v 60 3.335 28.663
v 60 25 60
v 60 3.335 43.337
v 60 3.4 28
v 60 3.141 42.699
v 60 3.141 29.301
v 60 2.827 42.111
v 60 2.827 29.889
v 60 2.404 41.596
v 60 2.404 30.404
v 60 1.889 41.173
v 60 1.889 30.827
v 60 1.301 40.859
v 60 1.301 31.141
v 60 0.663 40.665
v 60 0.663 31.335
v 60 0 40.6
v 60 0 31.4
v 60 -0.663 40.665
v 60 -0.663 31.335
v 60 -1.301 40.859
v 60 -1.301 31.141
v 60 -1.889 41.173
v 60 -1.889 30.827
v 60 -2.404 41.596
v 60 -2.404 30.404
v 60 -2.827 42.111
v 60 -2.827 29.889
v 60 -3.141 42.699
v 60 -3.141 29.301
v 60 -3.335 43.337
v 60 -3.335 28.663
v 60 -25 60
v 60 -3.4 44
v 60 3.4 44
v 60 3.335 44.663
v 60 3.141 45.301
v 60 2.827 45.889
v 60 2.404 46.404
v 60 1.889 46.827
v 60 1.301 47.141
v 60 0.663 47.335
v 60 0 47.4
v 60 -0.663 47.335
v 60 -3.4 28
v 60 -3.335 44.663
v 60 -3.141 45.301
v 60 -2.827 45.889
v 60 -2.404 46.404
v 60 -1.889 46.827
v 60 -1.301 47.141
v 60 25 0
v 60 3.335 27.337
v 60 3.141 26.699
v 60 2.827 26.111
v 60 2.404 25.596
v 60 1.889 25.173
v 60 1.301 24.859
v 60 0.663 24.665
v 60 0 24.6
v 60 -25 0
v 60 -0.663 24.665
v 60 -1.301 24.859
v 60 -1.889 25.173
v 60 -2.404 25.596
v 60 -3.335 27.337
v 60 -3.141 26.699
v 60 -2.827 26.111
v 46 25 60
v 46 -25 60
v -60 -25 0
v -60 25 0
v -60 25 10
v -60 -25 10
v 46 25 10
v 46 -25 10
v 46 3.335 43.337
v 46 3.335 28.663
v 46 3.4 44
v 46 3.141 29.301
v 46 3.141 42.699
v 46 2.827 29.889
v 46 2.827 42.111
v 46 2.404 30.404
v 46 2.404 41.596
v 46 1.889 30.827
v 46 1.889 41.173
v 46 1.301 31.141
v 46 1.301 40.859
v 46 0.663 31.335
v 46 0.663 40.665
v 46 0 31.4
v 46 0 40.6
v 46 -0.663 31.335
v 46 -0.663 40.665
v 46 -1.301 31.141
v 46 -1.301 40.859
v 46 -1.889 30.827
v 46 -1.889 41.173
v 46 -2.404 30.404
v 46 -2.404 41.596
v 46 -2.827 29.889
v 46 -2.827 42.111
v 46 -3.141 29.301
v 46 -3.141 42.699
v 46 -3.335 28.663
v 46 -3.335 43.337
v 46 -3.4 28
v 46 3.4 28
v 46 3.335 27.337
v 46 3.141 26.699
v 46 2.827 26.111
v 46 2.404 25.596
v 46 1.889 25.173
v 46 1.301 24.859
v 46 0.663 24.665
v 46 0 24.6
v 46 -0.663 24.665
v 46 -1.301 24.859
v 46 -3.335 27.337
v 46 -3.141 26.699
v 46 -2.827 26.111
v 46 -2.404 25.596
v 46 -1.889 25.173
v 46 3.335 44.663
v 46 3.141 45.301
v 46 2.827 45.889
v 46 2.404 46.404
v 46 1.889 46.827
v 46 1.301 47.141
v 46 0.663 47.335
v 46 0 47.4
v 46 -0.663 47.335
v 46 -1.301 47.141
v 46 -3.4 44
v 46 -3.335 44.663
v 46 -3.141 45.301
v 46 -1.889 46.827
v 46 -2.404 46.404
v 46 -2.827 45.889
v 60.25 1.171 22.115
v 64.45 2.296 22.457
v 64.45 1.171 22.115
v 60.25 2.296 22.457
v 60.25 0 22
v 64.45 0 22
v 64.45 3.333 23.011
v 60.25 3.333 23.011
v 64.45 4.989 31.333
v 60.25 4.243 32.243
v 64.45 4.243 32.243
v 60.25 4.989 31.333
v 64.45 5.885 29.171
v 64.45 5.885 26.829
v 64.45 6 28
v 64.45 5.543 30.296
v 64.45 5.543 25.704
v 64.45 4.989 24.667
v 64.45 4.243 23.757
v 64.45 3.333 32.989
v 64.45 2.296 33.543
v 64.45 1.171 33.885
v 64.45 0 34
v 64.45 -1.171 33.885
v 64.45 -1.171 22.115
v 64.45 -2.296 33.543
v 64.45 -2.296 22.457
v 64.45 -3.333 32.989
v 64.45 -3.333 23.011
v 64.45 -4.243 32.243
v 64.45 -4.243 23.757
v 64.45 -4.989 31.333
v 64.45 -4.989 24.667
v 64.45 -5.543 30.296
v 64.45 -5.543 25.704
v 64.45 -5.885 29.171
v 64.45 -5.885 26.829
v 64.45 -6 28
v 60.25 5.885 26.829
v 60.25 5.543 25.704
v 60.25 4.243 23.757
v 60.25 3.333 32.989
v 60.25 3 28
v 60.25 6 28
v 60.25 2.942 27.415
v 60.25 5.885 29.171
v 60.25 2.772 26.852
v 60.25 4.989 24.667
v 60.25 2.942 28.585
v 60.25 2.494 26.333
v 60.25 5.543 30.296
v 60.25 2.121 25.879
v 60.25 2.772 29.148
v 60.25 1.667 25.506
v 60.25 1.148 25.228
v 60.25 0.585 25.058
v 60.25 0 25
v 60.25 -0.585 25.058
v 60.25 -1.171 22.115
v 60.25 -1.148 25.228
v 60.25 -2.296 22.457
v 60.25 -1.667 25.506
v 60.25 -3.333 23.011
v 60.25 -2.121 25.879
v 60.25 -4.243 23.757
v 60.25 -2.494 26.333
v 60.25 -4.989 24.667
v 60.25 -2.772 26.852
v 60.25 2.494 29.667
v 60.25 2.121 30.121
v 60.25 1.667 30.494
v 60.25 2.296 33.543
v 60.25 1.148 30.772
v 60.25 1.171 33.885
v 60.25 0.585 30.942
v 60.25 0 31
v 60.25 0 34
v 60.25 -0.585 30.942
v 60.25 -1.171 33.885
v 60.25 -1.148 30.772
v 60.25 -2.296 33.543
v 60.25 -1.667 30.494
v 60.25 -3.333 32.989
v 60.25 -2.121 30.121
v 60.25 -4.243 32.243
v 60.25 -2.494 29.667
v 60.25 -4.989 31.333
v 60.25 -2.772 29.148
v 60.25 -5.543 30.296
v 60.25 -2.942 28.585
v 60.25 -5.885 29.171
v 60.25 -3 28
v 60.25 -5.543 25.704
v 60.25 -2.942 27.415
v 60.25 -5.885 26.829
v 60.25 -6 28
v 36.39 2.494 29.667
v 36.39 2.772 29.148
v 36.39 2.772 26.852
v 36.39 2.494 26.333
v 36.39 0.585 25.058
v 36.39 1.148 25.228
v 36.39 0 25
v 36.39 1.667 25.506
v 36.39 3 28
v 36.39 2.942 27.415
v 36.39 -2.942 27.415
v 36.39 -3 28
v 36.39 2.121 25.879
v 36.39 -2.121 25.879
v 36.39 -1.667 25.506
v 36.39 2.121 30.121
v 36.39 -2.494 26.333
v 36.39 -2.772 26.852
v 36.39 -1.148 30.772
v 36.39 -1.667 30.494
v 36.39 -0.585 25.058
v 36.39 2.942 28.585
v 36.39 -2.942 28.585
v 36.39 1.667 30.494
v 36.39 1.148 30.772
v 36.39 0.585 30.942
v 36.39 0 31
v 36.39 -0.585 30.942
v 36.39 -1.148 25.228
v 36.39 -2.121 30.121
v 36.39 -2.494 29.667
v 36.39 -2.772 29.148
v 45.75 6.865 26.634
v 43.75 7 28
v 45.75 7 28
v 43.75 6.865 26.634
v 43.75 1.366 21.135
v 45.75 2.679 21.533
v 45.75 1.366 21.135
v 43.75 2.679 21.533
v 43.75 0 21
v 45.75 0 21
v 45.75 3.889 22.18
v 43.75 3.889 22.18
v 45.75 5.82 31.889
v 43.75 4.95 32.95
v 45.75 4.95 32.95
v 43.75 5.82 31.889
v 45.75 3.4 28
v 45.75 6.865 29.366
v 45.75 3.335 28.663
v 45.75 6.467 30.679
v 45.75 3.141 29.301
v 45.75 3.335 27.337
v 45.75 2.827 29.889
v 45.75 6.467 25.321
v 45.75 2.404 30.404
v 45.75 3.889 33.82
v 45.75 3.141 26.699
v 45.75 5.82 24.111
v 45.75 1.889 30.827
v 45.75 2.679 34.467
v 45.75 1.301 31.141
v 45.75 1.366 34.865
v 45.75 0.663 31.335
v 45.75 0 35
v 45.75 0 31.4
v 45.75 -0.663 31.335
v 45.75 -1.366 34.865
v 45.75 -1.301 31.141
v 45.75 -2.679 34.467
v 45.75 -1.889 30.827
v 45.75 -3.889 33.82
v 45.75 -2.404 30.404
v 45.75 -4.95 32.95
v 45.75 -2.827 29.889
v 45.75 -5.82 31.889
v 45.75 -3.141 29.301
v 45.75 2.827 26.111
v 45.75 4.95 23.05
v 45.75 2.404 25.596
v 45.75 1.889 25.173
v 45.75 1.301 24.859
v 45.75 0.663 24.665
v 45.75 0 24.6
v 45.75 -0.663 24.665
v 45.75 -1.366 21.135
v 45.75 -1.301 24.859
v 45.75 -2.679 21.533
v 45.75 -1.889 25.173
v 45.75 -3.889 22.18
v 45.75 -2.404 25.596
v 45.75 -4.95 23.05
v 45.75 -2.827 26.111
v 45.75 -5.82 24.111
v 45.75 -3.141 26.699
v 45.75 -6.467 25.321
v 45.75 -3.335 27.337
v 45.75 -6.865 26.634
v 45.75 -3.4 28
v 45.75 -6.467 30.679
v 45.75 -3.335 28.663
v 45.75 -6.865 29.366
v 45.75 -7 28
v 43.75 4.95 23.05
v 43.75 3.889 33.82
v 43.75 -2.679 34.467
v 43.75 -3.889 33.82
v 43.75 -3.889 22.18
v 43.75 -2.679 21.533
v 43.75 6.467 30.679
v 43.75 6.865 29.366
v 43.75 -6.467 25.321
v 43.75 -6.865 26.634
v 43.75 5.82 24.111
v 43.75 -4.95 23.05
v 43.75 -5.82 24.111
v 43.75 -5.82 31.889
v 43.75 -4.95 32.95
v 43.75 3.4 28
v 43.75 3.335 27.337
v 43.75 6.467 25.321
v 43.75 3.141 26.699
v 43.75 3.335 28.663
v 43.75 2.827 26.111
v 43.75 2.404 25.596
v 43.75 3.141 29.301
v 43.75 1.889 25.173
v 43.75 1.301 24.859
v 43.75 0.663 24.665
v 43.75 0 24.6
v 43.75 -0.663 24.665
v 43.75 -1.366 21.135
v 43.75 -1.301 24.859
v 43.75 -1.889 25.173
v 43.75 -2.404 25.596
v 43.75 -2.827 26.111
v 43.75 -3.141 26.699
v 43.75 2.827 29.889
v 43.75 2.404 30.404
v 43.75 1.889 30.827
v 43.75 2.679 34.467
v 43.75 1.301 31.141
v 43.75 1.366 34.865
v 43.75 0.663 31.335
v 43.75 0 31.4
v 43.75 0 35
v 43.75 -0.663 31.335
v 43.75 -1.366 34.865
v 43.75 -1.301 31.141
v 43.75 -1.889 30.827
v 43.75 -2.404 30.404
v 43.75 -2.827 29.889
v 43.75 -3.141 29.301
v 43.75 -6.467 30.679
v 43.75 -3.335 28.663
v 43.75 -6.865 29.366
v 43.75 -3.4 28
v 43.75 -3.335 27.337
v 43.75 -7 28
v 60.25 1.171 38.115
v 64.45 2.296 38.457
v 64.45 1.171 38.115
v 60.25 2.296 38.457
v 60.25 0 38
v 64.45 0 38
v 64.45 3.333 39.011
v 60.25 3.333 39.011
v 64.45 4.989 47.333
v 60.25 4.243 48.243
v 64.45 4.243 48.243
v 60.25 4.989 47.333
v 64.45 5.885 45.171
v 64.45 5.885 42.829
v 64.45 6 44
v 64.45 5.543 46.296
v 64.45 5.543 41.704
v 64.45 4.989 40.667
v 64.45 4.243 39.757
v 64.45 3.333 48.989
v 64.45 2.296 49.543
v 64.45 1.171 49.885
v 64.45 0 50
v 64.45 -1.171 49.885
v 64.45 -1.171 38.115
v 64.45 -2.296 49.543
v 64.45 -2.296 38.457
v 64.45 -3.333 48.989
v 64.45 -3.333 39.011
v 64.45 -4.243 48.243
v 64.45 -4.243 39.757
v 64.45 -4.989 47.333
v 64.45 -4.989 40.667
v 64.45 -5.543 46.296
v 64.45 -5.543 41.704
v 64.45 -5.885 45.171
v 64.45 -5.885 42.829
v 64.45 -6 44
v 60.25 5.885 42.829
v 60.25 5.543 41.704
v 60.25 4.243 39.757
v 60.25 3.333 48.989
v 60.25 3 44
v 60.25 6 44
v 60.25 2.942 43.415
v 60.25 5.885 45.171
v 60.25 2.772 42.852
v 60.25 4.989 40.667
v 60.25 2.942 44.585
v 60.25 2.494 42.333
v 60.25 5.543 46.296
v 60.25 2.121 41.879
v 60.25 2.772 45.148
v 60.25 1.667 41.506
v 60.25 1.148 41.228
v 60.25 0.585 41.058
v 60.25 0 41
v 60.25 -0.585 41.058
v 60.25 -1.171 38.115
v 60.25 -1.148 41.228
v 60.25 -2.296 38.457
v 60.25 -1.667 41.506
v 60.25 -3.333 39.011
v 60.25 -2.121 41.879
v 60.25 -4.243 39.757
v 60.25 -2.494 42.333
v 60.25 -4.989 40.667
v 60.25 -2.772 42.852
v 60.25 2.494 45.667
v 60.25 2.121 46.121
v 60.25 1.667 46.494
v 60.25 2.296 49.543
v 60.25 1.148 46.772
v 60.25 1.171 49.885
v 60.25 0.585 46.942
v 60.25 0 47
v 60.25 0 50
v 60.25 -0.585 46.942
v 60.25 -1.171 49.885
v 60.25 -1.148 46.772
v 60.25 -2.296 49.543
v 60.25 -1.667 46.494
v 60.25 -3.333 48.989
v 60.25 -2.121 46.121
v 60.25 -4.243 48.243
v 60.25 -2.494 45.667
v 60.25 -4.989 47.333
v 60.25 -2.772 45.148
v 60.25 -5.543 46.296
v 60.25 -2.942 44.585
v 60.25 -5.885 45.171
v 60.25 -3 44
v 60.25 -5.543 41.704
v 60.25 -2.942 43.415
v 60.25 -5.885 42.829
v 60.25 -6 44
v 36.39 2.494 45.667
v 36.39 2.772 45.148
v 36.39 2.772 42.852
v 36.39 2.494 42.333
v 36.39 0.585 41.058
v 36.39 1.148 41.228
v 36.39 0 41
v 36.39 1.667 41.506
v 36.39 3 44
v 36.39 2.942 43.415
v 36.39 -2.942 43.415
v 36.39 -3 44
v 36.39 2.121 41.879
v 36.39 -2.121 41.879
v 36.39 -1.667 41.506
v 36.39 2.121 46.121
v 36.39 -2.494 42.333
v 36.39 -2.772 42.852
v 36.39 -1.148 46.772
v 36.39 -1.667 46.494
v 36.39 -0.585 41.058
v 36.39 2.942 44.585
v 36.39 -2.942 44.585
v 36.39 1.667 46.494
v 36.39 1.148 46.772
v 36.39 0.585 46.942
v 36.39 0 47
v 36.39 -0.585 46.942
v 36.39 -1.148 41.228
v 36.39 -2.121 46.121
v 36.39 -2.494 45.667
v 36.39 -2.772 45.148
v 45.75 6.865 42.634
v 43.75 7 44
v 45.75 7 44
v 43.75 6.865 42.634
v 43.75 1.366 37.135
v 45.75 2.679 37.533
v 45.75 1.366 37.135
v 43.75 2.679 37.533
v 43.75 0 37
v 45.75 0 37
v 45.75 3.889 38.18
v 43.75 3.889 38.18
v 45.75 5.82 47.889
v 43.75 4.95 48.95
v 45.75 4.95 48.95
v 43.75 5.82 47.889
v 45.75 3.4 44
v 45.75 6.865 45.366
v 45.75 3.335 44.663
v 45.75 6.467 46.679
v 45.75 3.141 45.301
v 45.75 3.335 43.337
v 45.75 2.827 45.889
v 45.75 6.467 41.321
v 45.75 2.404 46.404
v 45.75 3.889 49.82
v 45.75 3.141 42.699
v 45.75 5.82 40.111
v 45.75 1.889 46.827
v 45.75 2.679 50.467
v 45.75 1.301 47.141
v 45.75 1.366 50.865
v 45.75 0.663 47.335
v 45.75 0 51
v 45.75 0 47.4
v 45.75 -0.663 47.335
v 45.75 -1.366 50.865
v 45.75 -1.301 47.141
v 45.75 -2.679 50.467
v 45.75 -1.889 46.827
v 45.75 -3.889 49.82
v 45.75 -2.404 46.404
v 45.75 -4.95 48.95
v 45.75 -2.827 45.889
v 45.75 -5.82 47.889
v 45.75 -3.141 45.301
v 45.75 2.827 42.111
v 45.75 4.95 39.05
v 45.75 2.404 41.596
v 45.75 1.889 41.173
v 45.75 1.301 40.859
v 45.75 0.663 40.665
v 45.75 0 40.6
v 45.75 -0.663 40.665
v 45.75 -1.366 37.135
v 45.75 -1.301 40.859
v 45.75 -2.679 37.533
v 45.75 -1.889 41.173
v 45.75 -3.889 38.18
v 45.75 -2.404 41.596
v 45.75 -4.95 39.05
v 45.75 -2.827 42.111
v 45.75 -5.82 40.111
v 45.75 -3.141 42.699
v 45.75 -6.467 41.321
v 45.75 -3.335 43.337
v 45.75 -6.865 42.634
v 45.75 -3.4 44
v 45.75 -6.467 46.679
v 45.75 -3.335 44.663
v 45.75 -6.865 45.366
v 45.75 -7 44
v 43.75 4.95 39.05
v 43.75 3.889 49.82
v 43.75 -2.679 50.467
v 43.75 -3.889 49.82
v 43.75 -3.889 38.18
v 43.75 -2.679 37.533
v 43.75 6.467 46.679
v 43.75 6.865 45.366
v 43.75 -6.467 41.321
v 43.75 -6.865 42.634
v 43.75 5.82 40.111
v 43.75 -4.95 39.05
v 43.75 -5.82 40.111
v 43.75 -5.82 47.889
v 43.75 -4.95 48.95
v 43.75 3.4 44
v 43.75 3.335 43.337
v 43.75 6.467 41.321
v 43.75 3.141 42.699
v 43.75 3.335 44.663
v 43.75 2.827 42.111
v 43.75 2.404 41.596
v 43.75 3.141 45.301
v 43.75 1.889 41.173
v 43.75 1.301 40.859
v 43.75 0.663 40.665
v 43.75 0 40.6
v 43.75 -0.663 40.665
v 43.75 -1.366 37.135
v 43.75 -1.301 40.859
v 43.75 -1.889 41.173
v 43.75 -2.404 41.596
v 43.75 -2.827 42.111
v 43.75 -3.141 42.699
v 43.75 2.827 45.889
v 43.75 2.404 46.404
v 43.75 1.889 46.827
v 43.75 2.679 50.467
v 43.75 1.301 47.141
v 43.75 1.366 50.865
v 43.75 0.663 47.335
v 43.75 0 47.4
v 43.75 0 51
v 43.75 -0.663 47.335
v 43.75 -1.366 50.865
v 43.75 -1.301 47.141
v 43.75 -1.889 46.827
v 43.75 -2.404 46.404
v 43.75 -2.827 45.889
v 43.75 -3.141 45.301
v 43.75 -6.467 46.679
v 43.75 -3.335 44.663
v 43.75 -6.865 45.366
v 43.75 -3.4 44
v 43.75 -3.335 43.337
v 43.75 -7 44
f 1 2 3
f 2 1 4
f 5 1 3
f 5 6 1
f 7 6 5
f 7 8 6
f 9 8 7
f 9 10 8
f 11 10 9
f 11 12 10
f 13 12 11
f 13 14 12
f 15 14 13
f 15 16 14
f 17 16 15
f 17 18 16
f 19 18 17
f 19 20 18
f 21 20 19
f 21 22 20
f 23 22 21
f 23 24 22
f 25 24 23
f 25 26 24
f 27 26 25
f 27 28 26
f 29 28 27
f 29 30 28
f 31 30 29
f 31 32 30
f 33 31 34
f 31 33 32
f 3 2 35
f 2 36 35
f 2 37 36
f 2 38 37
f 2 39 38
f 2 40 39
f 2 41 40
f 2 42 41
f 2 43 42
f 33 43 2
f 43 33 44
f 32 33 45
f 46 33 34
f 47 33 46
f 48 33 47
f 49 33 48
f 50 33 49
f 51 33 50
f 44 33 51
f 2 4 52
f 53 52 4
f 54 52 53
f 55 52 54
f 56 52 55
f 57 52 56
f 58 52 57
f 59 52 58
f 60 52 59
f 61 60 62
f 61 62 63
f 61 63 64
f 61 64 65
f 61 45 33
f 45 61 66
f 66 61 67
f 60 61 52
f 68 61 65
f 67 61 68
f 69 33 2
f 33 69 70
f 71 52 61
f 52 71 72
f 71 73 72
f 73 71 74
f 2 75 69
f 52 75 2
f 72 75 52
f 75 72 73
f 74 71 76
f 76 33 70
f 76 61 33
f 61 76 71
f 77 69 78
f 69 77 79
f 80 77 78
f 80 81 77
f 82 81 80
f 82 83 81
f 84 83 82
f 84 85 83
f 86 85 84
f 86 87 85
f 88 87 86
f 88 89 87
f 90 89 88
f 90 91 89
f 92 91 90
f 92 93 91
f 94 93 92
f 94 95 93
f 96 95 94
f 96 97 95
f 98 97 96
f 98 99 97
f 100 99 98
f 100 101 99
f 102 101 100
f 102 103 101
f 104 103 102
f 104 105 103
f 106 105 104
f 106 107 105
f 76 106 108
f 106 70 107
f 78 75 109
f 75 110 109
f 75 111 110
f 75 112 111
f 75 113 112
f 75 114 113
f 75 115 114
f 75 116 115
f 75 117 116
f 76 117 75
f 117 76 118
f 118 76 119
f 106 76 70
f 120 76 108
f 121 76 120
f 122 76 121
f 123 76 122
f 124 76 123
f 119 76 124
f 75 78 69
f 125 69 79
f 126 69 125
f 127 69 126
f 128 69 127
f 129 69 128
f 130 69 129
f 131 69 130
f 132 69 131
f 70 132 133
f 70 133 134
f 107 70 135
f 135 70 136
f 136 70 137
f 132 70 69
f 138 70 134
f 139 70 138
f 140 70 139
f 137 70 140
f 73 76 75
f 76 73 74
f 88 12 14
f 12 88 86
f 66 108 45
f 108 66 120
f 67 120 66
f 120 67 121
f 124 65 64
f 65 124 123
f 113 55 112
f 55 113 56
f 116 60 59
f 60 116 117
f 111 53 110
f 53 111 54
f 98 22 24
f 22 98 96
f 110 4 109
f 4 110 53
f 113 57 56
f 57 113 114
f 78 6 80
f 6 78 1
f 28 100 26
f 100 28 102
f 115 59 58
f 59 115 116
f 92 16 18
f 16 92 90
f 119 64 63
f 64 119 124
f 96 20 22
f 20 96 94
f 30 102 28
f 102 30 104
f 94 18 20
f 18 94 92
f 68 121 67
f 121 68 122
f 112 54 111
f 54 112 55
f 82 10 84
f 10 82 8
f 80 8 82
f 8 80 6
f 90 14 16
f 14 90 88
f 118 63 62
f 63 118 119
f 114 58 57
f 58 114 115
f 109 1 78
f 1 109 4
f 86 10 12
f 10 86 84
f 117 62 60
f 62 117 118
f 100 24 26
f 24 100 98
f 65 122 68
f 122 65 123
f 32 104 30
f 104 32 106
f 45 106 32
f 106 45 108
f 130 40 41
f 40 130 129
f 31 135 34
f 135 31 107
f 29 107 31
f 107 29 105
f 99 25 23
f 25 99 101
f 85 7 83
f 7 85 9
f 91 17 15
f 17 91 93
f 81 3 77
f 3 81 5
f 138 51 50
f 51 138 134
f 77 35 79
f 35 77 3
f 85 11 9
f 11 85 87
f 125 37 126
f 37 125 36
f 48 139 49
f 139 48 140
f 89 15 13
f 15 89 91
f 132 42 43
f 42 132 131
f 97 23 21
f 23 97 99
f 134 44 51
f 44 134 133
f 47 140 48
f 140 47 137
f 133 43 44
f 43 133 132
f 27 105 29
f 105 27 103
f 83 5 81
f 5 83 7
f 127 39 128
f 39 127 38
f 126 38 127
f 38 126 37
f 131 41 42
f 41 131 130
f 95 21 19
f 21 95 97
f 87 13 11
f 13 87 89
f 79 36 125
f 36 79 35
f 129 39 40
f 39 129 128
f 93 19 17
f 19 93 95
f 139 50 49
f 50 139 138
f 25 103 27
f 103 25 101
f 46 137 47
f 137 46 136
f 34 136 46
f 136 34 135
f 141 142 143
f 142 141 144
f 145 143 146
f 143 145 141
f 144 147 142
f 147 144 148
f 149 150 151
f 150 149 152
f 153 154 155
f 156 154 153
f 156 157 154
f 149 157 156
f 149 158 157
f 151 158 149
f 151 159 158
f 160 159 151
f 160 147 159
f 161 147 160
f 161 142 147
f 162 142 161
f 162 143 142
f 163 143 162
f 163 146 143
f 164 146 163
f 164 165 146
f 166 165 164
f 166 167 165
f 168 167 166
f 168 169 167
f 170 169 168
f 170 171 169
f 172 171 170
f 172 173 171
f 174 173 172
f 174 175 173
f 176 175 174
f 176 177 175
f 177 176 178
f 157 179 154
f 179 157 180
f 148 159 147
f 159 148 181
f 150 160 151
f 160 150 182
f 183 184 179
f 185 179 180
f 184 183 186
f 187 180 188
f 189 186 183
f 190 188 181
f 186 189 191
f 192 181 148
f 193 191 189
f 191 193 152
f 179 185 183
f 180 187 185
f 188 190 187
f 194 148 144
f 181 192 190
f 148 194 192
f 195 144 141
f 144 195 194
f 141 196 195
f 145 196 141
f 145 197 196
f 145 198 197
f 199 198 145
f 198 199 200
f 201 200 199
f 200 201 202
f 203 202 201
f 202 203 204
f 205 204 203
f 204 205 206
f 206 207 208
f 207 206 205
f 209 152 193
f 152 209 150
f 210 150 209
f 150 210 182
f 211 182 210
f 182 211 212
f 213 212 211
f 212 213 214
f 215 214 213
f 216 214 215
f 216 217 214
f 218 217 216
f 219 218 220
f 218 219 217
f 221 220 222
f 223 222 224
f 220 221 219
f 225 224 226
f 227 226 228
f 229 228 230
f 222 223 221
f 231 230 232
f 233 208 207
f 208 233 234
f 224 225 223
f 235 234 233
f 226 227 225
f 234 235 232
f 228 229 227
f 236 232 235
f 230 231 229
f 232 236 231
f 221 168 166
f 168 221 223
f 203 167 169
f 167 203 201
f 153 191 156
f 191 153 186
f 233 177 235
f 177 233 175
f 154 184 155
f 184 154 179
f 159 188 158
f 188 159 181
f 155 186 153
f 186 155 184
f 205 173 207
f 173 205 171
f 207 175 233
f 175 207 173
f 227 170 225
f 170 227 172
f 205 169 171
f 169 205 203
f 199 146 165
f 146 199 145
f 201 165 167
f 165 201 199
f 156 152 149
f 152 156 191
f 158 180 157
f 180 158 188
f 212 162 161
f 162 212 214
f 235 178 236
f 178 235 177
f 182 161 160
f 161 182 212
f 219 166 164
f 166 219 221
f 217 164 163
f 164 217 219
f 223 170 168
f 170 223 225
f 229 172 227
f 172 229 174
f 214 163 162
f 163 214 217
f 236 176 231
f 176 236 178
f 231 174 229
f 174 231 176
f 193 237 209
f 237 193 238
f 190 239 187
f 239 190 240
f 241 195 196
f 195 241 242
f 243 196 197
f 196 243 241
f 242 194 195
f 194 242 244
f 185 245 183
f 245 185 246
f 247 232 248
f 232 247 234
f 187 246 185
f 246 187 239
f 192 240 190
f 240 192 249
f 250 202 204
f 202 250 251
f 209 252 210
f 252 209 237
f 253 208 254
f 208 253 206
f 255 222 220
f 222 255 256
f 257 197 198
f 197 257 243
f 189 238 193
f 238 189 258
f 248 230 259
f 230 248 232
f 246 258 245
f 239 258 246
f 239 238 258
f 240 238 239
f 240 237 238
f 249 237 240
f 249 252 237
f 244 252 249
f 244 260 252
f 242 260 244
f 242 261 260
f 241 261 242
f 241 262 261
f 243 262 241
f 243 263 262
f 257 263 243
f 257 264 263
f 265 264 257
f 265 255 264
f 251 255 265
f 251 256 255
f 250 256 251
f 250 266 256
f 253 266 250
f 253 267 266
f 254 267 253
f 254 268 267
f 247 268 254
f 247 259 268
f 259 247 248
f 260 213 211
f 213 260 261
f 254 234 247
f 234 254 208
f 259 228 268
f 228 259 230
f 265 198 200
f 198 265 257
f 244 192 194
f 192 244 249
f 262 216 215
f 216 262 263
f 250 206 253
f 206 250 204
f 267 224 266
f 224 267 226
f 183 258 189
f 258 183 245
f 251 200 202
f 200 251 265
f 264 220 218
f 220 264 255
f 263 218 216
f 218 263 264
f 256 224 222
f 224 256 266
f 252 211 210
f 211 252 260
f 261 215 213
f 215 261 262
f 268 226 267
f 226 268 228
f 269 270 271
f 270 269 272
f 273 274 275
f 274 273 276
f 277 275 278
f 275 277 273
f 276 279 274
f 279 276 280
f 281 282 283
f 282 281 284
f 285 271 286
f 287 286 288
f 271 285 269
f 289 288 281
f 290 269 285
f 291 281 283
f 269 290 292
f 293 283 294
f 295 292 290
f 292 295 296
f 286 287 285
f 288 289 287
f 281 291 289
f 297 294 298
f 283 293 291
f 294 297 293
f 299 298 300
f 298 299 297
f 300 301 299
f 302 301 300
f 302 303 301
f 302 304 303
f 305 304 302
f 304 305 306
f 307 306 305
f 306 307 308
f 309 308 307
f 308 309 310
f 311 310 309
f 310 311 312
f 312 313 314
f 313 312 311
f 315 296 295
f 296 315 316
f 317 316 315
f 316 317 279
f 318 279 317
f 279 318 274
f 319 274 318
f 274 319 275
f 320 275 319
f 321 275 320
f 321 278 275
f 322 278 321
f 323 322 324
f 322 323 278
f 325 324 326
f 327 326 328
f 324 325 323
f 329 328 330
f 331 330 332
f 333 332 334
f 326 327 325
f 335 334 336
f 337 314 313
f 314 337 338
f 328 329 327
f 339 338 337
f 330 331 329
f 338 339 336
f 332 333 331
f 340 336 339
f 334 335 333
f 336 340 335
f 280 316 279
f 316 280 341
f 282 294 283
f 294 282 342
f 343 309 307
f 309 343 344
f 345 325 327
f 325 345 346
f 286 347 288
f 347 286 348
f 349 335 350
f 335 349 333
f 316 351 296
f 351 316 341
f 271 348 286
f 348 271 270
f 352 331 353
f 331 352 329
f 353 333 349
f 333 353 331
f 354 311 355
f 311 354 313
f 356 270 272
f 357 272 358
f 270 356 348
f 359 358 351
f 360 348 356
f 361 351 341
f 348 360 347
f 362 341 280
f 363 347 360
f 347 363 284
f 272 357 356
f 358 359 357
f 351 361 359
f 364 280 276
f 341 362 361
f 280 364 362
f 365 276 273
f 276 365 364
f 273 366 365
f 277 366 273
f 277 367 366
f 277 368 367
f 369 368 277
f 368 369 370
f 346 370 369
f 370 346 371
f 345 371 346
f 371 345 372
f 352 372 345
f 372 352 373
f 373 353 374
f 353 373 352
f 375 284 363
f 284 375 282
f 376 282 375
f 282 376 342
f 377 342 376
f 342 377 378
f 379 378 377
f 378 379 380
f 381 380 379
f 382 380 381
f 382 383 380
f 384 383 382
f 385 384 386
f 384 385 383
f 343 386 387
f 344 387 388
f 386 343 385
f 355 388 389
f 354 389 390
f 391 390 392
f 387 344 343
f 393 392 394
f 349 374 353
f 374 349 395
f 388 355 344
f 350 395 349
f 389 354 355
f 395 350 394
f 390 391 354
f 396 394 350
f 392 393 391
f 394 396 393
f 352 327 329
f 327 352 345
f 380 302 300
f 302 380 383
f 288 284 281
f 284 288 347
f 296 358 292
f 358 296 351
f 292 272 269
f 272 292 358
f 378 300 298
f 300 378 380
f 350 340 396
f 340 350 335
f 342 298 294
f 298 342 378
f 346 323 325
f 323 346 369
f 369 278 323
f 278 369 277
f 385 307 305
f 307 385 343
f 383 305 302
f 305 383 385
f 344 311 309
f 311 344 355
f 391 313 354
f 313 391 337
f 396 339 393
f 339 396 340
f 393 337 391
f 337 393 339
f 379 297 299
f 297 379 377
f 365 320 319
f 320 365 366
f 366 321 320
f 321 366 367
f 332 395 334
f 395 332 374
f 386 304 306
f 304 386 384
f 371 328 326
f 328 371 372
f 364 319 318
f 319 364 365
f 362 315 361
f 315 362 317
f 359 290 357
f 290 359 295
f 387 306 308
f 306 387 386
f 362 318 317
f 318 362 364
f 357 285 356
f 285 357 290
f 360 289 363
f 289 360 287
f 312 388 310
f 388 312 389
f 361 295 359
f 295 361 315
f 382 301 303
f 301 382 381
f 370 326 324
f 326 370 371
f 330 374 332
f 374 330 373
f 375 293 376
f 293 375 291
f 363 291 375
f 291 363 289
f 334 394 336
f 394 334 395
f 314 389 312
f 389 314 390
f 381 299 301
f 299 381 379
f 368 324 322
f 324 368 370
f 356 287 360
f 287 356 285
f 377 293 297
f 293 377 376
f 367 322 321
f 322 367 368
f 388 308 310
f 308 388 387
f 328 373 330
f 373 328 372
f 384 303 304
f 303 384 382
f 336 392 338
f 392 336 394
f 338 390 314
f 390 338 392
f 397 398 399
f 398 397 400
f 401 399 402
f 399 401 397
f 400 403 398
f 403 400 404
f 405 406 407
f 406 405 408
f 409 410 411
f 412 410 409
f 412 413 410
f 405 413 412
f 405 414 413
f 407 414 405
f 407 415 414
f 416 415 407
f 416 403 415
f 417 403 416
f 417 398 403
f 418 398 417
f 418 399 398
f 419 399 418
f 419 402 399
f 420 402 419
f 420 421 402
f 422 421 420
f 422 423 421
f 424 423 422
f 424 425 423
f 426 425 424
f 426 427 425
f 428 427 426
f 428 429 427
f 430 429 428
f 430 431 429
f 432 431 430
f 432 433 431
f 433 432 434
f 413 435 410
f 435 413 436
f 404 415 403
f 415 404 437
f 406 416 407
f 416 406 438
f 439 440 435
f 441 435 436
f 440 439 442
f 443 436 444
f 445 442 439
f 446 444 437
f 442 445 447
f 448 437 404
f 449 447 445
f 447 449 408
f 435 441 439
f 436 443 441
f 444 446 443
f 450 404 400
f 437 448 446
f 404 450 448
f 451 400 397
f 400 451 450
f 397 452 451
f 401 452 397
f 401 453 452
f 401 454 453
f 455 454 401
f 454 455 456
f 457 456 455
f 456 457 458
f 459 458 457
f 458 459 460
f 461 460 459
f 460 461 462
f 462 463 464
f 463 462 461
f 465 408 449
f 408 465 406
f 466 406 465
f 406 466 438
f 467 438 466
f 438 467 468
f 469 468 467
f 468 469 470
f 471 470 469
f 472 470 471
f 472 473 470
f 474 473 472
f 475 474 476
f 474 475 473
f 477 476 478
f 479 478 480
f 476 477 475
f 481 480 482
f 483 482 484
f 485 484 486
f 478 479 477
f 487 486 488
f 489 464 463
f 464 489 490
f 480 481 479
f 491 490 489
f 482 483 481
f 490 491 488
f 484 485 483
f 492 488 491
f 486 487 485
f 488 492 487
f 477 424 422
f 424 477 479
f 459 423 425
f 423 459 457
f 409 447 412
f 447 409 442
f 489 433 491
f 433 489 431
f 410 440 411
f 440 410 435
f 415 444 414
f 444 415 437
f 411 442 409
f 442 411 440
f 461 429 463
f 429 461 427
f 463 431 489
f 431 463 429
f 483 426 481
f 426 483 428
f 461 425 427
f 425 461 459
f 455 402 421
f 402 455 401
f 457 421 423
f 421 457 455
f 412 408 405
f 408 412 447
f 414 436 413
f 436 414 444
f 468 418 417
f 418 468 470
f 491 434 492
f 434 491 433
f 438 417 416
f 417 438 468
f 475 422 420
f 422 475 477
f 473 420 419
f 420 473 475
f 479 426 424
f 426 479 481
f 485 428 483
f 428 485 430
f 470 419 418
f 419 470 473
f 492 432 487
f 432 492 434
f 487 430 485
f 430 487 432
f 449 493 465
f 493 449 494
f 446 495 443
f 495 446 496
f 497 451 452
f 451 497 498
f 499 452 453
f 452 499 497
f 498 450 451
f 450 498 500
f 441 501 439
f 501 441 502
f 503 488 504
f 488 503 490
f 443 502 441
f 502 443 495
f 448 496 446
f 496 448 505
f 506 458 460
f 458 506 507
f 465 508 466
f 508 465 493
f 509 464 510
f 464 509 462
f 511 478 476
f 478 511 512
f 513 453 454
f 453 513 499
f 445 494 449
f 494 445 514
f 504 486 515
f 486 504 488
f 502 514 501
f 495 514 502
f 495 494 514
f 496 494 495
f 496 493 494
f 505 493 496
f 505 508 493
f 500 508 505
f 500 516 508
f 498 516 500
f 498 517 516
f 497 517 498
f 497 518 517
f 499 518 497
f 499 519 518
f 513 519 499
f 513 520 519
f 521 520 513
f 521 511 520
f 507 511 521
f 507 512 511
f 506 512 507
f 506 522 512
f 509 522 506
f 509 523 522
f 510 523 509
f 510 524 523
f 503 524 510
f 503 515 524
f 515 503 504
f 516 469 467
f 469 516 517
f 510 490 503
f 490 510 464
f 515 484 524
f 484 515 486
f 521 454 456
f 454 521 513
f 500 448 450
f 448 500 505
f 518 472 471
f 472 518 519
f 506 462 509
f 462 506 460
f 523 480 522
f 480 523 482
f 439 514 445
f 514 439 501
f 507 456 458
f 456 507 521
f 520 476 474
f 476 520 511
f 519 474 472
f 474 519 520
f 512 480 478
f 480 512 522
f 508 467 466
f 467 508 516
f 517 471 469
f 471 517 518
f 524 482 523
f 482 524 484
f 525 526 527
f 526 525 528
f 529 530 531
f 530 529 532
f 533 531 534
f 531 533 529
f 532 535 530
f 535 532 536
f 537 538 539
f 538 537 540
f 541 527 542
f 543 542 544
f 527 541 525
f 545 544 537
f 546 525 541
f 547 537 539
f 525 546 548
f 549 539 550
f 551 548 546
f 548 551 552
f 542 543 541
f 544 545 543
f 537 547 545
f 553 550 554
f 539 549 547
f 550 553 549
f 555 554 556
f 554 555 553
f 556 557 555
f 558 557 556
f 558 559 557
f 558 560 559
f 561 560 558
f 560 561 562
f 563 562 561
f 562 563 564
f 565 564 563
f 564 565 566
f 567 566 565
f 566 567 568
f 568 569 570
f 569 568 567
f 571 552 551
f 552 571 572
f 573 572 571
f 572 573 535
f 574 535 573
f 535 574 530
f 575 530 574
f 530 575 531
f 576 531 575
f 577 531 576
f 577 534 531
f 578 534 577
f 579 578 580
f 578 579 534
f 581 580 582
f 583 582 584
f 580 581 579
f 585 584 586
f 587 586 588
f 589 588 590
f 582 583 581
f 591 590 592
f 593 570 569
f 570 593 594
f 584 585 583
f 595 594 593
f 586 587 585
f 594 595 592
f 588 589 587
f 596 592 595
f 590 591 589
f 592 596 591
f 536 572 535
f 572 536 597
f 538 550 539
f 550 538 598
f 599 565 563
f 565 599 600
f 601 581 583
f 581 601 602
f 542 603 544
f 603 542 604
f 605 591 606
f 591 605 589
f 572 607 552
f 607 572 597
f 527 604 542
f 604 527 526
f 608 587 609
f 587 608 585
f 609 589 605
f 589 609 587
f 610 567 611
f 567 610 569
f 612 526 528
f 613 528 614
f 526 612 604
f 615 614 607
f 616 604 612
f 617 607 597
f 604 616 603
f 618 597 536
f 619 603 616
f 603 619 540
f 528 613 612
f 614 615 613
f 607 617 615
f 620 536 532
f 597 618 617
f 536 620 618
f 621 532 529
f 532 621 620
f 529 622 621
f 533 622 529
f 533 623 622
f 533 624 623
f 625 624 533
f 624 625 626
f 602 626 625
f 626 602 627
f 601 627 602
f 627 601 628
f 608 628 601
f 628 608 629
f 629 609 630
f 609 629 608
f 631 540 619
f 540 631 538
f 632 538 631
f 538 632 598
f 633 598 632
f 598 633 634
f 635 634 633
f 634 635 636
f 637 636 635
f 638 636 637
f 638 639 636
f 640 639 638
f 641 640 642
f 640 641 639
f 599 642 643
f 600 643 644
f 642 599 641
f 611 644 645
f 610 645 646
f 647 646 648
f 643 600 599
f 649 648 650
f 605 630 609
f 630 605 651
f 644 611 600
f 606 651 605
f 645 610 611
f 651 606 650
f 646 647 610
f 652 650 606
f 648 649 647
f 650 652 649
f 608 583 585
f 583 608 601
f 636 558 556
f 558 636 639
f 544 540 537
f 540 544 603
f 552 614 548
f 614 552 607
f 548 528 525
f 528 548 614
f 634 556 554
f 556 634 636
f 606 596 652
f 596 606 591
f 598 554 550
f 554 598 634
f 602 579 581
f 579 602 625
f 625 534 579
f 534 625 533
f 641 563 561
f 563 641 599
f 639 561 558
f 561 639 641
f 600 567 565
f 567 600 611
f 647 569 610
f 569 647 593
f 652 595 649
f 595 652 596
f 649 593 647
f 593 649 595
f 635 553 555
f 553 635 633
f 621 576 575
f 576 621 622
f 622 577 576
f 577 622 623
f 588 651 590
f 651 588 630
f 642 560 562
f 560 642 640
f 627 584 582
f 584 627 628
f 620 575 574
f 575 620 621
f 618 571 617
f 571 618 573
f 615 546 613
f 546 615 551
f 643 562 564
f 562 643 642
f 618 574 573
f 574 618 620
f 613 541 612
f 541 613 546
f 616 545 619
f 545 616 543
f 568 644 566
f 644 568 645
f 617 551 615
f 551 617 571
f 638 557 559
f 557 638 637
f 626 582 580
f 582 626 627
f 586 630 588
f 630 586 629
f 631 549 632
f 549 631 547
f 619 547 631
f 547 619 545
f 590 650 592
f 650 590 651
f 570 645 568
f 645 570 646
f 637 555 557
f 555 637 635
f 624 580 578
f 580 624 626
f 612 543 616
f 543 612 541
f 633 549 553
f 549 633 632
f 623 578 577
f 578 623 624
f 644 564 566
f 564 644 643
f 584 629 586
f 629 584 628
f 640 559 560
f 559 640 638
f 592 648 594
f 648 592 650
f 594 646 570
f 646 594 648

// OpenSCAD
$fn = 32;

// ------------------------------------------------------------------------
// Bolted bracket: 120 x 50 mm bracket with 2 bolt joints
// Every part is its own module, assembly() places them once.
// ------------------------------------------------------------------------

// --- part 1 ---
module bracket() {
  difference() {
    translate([-60, -25, 0]) cube([120, 50, 60]);
    translate([-61, -26, 10]) cube([107, 52, 51]);
    translate([53, 0, 28]) rotate([0, 90, 0]) cylinder(h = 16, d = 6.8, center = true);
    translate([53, 0, 44]) rotate([0, 90, 0]) cylinder(h = 16, d = 6.8, center = true);
  }
}

// --- part 2 ---
module bolt1() {
  cylinder(h = 4.2, d = 12);
  translate([0, 0, -23.86]) cylinder(h = 23.86, d = 6);
}

// --- part 3 ---
module washer1() {
  difference() {
      translate([0, 0, 0]) cylinder(h = 2, d = 14);
      translate([0, 0, -1]) cylinder(h = 4, d = 6.8);
    }
}

// --- part 4 ---
module bolt2() {
  cylinder(h = 4.2, d = 12);
  translate([0, 0, -23.86]) cylinder(h = 23.86, d = 6);
}

// --- part 5 ---
module washer2() {
  difference() {
      translate([0, 0, 0]) cylinder(h = 2, d = 14);
      translate([0, 0, -1]) cylinder(h = 4, d = 6.8);
    }
}

// --- assembly ---
module assembly() {
  translate([0, 0, 0]) rotate([0, 0, 0]) bracket();
  translate([60.25, 0, 28]) rotate([0, 90, 0]) bolt1();
  translate([43.75, 0, 28]) rotate([0, 90, 0]) washer1();
  translate([60.25, 0, 44]) rotate([0, 90, 0]) bolt2();
  translate([43.75, 0, 44]) rotate([0, 90, 0]) washer2();
}

assembly();
